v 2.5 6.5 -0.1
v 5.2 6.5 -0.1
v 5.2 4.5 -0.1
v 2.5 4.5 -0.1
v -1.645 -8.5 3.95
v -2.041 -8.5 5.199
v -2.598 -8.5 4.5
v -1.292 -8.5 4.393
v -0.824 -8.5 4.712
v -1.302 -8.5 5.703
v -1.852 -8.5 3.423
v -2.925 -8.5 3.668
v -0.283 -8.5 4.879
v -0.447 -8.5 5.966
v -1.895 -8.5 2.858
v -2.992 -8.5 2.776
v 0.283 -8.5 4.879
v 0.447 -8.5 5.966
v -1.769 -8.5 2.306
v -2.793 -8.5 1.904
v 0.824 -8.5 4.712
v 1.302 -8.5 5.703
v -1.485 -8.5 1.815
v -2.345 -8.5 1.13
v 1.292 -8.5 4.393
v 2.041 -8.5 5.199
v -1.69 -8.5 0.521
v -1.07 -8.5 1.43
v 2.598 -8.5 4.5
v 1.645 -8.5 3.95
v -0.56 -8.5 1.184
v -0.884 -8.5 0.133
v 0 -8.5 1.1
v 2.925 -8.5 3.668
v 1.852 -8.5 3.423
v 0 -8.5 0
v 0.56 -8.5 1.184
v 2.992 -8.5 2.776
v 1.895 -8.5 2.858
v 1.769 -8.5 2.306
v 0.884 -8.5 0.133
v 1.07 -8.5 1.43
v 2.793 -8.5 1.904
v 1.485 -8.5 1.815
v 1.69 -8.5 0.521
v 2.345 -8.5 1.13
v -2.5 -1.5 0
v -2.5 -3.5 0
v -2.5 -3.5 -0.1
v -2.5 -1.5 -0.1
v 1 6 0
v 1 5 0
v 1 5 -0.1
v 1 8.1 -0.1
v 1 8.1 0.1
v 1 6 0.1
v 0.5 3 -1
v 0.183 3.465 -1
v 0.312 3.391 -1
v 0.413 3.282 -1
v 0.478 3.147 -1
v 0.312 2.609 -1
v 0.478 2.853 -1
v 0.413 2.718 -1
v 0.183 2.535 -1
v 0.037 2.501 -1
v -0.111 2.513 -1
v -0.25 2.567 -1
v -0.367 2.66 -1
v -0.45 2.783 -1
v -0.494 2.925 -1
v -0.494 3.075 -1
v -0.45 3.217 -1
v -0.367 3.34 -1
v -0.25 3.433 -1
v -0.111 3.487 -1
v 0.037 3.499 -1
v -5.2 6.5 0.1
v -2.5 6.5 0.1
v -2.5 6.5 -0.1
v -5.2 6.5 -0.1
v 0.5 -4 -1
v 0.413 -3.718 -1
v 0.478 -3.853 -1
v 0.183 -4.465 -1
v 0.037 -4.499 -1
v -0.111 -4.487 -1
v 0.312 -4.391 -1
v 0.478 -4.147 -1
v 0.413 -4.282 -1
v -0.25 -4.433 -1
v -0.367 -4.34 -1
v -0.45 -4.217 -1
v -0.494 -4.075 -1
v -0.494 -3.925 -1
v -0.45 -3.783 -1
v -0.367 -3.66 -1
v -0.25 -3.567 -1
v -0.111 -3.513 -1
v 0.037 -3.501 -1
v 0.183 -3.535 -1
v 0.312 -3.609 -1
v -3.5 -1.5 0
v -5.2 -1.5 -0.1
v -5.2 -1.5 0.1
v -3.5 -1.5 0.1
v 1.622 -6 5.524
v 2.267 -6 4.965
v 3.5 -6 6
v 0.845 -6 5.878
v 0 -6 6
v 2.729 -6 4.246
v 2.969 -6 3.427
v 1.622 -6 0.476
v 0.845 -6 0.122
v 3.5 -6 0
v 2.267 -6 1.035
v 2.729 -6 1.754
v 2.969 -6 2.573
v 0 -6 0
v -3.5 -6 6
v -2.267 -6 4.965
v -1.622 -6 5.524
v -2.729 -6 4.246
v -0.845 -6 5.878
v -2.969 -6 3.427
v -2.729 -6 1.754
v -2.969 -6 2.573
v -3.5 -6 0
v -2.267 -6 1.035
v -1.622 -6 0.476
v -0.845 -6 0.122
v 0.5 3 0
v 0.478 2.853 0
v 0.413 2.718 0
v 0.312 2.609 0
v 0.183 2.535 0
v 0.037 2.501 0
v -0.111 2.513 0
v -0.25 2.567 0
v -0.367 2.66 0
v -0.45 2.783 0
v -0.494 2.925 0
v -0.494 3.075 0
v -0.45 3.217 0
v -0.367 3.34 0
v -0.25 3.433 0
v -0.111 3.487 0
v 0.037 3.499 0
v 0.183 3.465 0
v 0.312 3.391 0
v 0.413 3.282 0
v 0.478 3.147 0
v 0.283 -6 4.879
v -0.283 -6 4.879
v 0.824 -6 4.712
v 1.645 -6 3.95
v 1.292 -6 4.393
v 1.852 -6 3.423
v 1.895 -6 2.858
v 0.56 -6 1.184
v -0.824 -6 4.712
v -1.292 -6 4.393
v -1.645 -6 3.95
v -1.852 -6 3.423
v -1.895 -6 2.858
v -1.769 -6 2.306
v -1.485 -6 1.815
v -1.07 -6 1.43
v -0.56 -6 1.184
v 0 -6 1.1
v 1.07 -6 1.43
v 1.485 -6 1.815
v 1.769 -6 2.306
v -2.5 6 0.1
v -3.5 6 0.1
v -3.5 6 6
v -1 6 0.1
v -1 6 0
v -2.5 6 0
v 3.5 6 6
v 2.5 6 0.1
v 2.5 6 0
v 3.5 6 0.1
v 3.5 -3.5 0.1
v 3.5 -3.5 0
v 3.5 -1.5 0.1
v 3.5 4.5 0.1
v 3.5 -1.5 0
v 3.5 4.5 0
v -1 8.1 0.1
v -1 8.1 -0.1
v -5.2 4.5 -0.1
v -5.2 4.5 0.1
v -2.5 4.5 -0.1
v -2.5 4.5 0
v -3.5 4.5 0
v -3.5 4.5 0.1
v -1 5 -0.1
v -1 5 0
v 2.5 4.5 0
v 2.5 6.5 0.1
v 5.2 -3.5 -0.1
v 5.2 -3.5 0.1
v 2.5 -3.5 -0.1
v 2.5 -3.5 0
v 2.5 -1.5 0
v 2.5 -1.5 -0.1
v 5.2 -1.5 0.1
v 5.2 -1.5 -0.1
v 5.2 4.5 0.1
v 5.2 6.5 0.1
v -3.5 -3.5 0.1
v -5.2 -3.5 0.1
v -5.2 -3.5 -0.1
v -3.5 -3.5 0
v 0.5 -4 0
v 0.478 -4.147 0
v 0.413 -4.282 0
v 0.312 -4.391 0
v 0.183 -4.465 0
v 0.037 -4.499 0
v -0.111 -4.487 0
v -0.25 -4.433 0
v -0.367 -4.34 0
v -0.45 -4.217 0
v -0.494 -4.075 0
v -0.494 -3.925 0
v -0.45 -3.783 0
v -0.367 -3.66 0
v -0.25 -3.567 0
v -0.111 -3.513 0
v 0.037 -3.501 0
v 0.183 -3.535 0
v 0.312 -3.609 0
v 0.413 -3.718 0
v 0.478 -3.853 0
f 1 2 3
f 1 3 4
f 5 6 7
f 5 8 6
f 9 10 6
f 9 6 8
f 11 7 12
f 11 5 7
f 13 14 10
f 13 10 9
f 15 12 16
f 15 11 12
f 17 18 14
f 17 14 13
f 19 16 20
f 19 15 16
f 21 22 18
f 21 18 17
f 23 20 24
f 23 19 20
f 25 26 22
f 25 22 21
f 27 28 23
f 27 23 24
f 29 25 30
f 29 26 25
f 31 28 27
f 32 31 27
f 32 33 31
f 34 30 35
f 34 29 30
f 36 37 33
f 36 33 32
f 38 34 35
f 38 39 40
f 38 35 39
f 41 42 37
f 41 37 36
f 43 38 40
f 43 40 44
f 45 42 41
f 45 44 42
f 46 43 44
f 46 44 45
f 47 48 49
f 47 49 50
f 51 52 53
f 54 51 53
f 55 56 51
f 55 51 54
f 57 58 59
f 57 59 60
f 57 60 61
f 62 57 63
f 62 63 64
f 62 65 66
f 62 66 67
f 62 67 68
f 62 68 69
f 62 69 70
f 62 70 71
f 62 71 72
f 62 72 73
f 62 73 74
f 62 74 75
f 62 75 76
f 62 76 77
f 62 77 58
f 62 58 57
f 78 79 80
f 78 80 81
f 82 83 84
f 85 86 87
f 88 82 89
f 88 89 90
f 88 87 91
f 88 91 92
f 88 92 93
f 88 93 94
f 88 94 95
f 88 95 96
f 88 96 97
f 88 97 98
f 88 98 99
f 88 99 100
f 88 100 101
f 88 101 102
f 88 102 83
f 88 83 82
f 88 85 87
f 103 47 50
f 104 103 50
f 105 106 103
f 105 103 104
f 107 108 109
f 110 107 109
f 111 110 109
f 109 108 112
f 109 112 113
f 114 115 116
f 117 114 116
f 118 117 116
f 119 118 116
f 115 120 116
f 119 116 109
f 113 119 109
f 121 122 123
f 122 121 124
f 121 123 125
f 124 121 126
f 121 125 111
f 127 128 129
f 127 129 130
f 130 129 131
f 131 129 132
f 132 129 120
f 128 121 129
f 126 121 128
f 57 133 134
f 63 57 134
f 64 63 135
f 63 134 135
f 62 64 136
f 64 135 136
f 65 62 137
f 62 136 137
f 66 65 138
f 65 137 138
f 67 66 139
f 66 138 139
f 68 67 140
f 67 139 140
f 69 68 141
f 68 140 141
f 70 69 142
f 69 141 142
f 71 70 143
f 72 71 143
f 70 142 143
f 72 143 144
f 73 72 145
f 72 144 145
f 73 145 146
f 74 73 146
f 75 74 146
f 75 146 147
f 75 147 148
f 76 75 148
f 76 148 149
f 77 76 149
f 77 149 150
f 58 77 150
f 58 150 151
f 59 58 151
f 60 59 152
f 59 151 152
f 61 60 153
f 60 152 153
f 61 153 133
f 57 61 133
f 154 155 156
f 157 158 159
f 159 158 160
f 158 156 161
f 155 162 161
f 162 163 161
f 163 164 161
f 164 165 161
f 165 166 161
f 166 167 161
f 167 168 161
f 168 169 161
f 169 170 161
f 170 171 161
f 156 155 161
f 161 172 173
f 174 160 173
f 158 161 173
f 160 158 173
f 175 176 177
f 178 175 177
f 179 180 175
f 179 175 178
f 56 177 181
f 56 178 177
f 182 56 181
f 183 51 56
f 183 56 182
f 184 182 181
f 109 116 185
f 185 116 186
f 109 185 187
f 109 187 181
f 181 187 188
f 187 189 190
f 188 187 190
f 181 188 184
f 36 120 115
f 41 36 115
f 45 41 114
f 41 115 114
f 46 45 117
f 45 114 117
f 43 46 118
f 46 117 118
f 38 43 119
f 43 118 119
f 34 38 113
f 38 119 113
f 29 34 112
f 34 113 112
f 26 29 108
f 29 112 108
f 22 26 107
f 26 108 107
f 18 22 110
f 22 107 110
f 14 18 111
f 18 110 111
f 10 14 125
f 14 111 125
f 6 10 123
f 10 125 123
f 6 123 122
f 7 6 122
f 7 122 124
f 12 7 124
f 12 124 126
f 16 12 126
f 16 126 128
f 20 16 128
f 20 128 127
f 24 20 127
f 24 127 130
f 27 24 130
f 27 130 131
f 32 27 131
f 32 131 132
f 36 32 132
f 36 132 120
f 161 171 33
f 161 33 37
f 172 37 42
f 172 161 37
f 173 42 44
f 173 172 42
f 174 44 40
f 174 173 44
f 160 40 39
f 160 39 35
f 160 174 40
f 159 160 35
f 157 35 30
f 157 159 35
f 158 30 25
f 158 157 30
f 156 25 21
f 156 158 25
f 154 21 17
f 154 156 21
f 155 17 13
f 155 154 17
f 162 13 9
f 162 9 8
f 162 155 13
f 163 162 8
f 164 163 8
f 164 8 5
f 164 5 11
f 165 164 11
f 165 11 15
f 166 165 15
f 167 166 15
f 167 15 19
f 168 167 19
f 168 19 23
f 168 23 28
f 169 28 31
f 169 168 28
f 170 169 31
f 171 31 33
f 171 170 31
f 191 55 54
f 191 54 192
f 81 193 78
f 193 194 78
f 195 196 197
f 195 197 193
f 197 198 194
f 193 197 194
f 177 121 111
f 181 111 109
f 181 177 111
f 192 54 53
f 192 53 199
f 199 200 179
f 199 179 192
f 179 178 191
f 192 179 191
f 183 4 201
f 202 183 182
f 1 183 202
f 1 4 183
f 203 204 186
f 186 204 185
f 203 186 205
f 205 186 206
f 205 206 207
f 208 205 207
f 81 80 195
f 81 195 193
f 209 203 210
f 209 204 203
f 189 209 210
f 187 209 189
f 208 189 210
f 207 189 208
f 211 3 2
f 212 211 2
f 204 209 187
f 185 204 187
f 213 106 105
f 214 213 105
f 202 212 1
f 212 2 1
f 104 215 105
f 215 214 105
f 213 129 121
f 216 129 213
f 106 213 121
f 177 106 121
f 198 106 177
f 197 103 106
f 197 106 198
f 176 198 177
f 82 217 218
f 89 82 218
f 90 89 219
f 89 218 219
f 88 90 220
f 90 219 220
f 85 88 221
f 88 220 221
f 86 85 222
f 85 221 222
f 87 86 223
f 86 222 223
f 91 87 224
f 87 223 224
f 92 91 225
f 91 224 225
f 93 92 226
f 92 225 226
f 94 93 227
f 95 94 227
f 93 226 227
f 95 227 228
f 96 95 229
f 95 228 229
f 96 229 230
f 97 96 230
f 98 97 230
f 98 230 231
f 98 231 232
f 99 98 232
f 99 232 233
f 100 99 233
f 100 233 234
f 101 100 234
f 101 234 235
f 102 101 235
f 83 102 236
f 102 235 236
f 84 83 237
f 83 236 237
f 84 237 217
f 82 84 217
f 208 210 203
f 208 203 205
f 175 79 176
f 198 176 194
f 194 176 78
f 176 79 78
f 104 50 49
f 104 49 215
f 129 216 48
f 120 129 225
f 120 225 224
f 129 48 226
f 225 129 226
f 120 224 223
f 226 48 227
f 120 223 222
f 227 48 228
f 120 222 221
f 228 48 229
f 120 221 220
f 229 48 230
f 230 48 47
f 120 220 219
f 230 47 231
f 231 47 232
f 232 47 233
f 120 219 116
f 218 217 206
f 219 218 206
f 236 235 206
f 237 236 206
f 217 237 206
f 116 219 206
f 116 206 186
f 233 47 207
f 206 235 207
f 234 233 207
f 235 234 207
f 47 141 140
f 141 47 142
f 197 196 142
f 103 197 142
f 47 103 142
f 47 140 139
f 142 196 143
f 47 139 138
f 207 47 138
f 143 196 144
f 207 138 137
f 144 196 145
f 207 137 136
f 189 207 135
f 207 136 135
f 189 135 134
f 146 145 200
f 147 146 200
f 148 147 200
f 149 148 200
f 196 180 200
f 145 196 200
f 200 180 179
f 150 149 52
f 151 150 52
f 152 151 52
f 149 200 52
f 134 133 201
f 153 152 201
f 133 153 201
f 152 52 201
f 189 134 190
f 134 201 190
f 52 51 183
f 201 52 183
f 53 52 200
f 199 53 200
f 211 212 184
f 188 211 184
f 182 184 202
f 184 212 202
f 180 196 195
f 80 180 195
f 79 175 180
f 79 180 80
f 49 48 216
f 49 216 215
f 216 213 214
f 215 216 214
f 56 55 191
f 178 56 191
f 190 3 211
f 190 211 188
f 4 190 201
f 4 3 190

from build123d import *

# Parameters (mm, degrees)
SKETCH1_W           = 7
SKETCH1_H           = 12
BOSS_EXTRUDE1_DEPTH = 6
SKETCH2_R           = 3
SKETCH2_R_2         = 1.9
BOSS_EXTRUDE2_DEPTH = 2.5
SKETCH3_R           = 0.5
BOSS_EXTRUDE3_DEPTH = 1
SKETCH4_W           = 2.7
SKETCH4_H           = 2
SKETCH4_W_2         = 2
SKETCH4_H_2         = 3.1
BOSS_EXTRUDE4_DEPTH = 0.1


with BuildPart() as part:
    # Sketch1 → Boss-Extrude1 (new body)
    with BuildSketch(Plane.XY):
        Rectangle(SKETCH1_W, SKETCH1_H)
    extrude(amount=BOSS_EXTRUDE1_DEPTH)

    # Sketch2 → Boss-Extrude2 (add)
    with BuildSketch(Plane.XZ.offset(6)):
        with Locations((0, 3)):
            Circle(SKETCH2_R)
        with Locations((0, 3)):
            Circle(SKETCH2_R_2, mode=Mode.SUBTRACT)
    extrude(amount=BOSS_EXTRUDE2_DEPTH)

    # Sketch3 → Boss-Extrude3 (add)
    with BuildSketch(Plane(origin=(0, 0, 0), x_dir=(-1, 0, 0), z_dir=(0, 0, -1))):
        with Locations((0, -4)):
            Circle(SKETCH3_R)
        with Locations((0, 3)):
            Circle(SKETCH3_R)
    extrude(amount=BOSS_EXTRUDE3_DEPTH)

    # Sketch4 → Boss-Extrude4 (add, symmetric)
    with BuildSketch(Plane(origin=(0, 0, 0), x_dir=(-1, 0, 0), z_dir=(0, 0, -1))):
        with Locations((3.85, 5.5)):
            Rectangle(SKETCH4_W, SKETCH4_H)
        with Locations((3.85, -2.5)):
            Rectangle(SKETCH4_W, SKETCH4_H)
        with Locations((0, 6.55)):
            Rectangle(SKETCH4_W_2, SKETCH4_H_2)
        with Locations((-3.85, -2.5)):
            Rectangle(SKETCH4_W, SKETCH4_H)
        with Locations((-3.85, 5.5)):
            Rectangle(SKETCH4_W, SKETCH4_H)
    extrude(amount=BOSS_EXTRUDE4_DEPTH, both=True)


solid = part.part
